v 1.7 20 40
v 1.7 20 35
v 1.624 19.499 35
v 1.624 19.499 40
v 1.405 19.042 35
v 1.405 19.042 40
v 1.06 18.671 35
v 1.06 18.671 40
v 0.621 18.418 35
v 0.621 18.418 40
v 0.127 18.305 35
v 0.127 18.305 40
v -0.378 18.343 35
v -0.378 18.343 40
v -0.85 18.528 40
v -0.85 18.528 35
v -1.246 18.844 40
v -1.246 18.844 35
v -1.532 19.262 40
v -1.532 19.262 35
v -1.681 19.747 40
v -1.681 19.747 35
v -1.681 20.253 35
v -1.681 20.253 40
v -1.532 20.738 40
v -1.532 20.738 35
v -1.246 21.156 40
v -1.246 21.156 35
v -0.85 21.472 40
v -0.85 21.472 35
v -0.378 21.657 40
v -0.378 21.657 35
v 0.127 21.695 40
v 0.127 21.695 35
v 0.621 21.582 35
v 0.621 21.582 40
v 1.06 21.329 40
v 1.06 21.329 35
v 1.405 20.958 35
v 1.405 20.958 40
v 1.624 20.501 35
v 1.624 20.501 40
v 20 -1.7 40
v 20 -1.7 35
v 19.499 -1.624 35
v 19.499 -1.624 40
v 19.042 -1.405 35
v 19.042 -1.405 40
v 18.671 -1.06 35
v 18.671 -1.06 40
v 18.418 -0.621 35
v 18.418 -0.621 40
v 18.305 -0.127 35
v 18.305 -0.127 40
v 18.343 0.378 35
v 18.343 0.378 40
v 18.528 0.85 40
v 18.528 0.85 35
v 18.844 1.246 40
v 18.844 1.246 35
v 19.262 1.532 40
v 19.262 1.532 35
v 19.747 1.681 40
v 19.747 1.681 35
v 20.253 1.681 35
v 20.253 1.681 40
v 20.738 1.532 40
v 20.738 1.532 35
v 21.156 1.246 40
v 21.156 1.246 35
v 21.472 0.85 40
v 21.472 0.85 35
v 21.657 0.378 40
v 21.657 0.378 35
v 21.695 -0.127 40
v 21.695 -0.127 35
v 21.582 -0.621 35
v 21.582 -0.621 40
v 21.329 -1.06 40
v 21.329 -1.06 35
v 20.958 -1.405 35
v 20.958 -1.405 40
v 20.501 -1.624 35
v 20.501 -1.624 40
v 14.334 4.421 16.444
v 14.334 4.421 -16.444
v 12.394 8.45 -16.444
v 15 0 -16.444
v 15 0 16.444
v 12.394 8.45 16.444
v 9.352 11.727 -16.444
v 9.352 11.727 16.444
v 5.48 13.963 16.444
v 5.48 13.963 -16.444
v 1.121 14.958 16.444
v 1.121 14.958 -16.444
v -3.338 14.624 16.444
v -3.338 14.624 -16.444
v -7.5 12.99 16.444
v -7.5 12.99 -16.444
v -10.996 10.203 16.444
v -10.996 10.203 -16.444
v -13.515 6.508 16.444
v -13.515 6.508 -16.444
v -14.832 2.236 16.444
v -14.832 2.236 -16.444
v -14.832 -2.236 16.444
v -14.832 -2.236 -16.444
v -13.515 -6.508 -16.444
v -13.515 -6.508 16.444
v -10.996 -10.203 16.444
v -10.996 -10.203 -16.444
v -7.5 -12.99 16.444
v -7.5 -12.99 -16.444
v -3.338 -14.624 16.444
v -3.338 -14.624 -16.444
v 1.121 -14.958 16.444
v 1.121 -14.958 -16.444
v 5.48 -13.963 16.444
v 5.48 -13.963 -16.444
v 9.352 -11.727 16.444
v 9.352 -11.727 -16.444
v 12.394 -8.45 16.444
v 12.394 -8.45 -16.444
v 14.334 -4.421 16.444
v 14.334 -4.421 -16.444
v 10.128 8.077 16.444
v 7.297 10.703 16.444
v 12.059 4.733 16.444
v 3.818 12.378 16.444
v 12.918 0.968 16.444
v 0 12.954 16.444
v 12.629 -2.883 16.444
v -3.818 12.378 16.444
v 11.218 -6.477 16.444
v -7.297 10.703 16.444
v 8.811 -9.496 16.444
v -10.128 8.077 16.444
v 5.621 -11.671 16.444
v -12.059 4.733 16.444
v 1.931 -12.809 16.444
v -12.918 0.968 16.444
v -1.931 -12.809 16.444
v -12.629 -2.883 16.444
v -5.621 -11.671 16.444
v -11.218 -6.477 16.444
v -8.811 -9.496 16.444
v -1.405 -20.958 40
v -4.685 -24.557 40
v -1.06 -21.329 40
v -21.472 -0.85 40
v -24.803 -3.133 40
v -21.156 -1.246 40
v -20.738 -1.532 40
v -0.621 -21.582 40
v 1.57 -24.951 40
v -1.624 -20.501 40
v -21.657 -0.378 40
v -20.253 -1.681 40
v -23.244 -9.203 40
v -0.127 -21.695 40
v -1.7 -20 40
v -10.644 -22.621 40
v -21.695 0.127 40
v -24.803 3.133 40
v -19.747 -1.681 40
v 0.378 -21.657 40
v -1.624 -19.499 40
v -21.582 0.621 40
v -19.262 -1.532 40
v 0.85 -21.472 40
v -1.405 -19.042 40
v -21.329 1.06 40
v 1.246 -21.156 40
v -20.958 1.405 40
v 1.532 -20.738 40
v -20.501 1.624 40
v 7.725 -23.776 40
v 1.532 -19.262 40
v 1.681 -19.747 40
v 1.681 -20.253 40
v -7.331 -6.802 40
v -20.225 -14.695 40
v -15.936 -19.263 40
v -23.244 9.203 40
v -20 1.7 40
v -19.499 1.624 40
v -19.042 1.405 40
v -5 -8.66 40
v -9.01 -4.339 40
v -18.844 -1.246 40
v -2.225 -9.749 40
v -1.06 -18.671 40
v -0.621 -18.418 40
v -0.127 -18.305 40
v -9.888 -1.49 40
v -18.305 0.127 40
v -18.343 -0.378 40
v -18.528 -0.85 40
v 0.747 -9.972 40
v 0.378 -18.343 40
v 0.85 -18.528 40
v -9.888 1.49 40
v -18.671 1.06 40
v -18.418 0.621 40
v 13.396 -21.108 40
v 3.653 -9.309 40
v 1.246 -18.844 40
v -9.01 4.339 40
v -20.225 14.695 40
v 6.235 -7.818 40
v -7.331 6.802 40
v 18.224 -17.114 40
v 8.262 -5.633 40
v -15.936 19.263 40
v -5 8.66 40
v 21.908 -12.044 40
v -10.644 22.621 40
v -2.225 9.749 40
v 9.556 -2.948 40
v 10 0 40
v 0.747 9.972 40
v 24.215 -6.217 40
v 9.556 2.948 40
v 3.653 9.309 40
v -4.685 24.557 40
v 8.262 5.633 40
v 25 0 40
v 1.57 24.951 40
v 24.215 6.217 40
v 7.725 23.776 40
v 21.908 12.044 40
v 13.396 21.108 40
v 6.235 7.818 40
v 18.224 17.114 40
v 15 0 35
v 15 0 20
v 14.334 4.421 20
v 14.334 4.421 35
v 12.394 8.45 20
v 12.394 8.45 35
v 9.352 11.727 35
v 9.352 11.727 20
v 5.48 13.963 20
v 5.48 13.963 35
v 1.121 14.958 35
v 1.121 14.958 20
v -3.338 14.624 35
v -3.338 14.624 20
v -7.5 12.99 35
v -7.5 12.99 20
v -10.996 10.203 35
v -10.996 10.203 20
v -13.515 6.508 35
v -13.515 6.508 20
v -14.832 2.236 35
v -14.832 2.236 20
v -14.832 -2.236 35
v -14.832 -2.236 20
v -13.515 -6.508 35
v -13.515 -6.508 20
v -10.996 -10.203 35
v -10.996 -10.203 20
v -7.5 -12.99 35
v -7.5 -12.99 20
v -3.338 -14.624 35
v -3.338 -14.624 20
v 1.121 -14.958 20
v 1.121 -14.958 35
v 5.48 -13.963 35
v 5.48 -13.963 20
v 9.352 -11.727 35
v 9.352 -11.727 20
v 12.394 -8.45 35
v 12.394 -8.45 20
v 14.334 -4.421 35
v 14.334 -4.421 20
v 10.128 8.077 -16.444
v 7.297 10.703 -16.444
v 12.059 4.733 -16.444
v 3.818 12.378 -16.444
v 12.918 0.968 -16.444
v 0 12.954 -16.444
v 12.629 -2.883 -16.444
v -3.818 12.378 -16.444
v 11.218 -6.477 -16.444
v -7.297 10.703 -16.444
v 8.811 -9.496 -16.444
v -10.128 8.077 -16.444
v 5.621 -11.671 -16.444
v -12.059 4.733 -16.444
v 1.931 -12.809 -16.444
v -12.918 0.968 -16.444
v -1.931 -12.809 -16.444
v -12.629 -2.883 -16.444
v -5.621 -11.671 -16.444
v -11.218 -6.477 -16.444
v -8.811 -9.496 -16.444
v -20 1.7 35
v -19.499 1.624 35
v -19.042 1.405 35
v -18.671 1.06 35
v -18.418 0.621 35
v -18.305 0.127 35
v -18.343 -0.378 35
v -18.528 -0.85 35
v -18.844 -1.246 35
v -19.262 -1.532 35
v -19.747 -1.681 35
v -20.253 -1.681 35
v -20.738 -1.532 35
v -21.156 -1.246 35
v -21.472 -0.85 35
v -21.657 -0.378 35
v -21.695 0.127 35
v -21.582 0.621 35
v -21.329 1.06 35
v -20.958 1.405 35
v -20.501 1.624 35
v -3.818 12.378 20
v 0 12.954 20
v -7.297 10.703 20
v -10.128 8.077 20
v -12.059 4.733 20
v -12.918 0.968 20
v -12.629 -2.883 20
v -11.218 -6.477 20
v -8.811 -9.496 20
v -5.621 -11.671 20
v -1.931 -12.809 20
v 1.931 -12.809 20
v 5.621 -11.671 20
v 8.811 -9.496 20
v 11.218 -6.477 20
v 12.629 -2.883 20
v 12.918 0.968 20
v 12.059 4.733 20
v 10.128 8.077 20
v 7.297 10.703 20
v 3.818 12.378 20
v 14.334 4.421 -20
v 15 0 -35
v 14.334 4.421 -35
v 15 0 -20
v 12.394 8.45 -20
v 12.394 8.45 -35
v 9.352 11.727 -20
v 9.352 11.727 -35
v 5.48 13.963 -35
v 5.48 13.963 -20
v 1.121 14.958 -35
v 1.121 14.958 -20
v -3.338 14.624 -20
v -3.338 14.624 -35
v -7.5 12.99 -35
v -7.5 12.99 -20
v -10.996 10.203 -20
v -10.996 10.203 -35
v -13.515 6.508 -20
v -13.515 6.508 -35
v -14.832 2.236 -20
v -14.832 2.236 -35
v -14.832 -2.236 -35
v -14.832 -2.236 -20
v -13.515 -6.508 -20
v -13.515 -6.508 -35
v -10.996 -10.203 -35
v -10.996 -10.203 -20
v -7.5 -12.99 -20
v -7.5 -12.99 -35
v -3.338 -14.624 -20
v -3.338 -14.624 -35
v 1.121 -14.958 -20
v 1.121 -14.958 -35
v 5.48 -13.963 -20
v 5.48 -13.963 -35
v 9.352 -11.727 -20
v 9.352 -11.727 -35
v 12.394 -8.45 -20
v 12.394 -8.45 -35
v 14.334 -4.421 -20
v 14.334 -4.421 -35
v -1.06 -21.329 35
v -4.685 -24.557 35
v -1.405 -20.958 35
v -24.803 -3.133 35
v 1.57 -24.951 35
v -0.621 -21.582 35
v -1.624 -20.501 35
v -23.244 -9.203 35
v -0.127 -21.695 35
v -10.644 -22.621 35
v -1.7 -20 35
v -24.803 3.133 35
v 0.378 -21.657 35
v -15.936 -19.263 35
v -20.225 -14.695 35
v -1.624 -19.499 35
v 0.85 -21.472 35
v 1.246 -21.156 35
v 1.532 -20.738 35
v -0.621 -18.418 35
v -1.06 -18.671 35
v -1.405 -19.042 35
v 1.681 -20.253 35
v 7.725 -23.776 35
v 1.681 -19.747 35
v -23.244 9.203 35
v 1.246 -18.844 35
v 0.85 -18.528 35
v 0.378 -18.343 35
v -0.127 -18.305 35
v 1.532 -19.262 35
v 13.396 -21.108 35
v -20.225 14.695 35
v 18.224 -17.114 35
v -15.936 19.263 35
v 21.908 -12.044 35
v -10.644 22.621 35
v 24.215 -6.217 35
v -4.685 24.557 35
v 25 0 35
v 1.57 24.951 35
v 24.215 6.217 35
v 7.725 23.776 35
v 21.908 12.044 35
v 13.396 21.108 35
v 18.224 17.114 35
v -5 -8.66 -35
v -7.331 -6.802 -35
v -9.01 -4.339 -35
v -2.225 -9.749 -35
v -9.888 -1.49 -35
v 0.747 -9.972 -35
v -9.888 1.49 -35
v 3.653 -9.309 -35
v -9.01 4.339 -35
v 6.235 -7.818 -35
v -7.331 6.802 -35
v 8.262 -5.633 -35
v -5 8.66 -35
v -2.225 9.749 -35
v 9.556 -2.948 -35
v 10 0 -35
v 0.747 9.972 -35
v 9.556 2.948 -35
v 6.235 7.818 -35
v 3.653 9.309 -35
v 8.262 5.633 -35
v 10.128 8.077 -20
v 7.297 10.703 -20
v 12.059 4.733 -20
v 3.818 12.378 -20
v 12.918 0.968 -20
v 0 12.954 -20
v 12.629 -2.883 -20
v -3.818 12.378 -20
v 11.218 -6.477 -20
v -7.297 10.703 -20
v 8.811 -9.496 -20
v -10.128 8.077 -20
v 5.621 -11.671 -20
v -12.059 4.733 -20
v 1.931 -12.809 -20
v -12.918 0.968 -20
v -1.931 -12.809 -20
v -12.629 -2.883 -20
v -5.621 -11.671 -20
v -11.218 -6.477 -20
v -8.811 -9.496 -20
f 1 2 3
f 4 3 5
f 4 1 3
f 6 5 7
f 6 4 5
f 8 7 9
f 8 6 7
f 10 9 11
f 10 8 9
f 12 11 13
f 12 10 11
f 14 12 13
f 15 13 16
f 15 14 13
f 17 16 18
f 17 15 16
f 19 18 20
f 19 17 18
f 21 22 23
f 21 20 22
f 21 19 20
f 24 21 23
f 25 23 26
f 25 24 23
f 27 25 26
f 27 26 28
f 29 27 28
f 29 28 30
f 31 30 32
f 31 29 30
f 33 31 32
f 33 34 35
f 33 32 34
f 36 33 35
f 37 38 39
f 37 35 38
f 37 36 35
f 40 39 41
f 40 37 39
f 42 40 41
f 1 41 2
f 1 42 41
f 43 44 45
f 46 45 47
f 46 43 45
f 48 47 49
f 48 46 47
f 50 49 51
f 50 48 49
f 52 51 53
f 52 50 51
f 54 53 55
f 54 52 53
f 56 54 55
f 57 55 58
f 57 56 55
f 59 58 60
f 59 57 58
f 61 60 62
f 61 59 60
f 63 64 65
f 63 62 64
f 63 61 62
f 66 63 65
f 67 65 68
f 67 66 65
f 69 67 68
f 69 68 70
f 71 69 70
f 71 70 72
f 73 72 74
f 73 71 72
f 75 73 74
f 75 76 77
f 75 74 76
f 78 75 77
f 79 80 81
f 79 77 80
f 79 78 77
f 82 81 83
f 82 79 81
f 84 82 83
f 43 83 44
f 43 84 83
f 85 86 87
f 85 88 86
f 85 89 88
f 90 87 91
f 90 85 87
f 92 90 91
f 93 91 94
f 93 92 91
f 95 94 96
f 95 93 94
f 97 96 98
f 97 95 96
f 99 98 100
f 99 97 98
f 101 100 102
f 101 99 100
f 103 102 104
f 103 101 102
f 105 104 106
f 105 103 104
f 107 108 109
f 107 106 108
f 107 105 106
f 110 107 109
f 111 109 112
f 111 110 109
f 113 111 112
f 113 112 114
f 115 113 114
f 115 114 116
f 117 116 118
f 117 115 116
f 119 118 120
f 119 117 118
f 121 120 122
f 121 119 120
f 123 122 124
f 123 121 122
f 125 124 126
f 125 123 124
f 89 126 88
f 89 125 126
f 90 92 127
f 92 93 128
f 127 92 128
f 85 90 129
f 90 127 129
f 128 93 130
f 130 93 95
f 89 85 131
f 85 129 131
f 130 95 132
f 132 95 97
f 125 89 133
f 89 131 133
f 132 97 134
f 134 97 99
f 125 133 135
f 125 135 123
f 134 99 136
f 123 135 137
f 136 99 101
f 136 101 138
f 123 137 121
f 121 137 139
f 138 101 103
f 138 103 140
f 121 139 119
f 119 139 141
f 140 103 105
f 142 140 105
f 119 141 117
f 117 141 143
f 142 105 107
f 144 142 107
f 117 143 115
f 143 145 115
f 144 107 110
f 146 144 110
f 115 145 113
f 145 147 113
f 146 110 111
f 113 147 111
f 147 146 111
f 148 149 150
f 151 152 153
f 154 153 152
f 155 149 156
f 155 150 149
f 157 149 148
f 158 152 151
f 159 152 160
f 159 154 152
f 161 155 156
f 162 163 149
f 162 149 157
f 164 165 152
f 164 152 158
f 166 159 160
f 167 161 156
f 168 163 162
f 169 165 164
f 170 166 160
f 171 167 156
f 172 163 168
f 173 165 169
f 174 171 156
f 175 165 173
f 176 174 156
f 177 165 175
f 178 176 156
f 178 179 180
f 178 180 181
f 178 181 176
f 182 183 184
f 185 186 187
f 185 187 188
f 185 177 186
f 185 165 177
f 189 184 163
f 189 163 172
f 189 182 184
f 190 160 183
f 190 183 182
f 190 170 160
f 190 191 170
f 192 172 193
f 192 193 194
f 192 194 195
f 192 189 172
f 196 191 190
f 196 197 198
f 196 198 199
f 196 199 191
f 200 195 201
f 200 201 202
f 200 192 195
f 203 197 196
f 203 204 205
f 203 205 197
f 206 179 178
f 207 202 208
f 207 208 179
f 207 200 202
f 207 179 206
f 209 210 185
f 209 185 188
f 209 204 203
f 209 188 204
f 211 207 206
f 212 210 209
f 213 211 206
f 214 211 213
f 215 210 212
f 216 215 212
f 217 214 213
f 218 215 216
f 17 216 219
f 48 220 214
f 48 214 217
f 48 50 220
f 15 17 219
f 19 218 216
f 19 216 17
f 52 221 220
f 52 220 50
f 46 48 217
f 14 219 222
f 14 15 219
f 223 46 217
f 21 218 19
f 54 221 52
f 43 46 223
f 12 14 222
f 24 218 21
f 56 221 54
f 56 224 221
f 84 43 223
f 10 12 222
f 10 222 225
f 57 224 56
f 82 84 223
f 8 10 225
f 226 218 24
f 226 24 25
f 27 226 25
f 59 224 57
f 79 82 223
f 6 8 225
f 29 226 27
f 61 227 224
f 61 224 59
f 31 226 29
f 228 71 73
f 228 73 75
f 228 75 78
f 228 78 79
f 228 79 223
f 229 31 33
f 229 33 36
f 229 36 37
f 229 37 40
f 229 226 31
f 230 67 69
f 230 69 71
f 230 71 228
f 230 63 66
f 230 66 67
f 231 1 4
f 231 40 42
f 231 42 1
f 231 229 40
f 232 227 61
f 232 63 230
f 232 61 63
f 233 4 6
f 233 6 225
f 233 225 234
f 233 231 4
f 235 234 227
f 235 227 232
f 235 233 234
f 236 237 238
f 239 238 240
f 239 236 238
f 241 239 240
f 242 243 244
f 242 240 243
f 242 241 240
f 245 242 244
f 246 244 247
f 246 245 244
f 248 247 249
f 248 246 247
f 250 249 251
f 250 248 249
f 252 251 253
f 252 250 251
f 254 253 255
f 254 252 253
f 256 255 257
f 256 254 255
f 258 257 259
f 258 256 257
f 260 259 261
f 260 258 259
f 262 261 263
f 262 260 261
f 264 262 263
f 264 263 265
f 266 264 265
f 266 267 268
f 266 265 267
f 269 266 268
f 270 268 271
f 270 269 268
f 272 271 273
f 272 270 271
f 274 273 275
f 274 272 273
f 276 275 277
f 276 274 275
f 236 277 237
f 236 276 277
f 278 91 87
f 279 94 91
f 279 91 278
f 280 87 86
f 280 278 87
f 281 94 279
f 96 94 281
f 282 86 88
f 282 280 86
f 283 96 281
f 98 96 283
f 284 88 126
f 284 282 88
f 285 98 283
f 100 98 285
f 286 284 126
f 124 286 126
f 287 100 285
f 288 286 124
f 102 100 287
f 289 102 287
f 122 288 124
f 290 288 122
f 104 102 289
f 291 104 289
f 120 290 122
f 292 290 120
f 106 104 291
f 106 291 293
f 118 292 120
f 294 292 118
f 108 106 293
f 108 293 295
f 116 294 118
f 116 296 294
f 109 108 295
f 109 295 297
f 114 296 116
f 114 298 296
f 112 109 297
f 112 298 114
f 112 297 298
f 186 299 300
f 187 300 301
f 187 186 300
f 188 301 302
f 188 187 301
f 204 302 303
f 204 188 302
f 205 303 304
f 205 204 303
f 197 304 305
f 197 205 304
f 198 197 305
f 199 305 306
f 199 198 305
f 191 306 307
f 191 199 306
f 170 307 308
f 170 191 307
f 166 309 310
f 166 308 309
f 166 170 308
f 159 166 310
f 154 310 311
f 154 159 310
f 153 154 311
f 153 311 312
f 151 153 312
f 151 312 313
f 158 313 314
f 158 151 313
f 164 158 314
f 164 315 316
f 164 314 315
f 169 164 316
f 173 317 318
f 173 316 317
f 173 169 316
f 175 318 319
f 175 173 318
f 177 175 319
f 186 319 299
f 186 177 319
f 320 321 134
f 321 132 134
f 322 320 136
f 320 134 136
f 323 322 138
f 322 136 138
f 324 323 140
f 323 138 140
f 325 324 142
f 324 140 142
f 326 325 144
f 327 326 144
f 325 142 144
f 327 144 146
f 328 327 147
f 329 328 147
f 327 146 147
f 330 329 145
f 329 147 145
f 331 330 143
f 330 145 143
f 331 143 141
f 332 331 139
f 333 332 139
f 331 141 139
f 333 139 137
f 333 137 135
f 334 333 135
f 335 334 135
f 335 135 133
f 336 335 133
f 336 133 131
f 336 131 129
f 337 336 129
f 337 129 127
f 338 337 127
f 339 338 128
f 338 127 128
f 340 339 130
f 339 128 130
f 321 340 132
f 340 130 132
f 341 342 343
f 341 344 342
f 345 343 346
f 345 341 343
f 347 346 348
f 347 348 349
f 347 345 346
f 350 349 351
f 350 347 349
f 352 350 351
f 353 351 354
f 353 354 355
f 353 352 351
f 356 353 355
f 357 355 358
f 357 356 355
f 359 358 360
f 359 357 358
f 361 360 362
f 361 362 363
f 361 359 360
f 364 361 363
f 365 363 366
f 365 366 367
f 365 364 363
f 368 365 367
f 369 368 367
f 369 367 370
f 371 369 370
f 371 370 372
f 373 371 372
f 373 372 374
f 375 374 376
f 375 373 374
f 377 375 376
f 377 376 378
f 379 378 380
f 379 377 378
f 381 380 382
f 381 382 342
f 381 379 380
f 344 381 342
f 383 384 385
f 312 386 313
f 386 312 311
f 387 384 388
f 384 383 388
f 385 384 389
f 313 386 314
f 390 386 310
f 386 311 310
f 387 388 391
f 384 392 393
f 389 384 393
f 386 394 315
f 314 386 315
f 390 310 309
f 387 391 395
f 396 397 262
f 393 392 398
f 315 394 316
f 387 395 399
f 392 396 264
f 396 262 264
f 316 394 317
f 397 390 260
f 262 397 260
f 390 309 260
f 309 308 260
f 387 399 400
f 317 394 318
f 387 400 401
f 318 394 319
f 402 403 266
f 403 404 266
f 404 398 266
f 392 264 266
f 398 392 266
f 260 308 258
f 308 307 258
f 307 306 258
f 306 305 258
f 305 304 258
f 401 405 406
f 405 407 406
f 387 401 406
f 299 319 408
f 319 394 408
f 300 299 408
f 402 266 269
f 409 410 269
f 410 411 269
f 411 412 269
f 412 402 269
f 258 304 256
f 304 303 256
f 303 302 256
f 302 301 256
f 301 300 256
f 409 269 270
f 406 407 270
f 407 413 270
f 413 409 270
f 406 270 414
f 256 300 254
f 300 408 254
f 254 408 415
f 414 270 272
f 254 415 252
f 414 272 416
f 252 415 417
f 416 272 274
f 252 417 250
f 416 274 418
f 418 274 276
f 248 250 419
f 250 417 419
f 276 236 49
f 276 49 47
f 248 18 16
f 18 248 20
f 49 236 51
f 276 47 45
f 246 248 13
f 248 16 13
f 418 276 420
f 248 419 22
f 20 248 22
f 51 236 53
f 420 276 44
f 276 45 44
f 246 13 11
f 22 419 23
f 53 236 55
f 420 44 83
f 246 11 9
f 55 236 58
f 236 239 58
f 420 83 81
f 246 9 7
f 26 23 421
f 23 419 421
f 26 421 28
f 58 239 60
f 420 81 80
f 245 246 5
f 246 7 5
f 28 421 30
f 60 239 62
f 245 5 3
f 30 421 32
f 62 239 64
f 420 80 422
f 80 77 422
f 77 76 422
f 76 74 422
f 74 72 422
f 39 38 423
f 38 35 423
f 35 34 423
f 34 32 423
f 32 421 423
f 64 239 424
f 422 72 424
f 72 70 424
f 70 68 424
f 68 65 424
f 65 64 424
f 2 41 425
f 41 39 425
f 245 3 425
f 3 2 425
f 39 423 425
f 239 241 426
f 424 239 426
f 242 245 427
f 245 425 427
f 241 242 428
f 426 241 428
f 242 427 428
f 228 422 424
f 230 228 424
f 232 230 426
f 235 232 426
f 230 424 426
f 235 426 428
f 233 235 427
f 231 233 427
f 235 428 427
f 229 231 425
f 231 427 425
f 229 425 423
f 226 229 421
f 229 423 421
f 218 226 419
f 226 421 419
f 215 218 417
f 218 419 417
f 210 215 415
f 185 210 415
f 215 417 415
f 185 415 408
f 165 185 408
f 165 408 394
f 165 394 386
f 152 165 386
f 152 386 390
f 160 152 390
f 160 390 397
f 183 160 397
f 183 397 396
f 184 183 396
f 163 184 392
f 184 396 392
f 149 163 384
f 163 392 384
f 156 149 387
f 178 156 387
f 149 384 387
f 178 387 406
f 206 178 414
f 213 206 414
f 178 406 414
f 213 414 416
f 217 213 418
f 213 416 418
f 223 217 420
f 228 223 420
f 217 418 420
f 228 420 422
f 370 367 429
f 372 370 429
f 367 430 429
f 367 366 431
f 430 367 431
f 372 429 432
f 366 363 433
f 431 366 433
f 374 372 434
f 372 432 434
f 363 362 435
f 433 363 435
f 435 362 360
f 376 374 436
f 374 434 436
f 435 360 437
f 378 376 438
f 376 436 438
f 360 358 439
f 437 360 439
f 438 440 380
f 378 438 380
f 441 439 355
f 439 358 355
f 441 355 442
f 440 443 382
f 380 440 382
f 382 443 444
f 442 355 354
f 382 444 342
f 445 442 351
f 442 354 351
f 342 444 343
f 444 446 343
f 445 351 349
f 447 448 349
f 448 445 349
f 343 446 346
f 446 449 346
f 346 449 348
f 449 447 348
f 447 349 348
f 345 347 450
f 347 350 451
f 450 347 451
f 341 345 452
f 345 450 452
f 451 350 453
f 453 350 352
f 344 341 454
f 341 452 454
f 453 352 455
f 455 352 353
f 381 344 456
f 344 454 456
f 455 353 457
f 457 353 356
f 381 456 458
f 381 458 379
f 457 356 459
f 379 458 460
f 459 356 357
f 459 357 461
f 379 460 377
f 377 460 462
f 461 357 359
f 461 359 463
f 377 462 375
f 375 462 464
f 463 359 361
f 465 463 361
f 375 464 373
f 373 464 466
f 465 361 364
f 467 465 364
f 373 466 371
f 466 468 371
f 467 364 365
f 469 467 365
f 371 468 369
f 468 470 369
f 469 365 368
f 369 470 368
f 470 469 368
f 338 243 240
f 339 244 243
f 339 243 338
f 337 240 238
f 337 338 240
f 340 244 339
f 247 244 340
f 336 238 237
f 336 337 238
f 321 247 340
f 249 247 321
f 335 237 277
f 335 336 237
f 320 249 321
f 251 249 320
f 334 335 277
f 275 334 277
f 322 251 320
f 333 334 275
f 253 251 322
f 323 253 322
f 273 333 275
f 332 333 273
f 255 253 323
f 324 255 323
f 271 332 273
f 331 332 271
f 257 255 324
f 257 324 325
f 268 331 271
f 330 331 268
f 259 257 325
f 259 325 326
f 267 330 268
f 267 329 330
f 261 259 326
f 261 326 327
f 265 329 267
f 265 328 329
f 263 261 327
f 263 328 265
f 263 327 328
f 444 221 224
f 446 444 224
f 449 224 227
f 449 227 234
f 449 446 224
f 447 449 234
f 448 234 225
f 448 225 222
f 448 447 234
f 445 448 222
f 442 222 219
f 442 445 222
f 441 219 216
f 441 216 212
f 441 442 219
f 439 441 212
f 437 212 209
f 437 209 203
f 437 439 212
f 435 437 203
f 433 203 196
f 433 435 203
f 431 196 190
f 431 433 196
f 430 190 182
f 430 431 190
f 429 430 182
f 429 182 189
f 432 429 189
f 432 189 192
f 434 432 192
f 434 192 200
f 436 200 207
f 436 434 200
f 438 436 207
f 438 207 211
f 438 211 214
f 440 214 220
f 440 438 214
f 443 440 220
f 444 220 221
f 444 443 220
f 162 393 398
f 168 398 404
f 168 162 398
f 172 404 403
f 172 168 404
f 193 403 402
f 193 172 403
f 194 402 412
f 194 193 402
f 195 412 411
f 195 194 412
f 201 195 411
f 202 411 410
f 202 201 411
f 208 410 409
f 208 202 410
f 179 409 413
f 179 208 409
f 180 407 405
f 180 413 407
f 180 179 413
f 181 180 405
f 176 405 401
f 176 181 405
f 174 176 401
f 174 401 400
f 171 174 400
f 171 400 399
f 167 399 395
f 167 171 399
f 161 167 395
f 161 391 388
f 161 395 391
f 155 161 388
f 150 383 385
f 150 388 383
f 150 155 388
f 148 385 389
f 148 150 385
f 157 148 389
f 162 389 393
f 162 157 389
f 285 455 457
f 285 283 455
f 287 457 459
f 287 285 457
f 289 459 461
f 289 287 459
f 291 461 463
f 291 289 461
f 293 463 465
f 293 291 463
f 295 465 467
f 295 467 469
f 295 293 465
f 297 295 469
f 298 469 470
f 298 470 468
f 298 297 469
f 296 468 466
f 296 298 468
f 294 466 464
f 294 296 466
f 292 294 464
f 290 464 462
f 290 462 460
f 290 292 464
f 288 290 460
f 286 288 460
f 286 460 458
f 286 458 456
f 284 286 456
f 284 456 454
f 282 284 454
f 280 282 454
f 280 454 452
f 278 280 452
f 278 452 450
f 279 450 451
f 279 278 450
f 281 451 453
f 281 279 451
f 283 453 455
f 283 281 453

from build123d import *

# Parameters (mm, degrees)
SKETCH1_R           = 15
SKETCH1_R_2         = 10
BOSS_EXTRUDE1_DEPTH = 35
SKETCH5_W           = 3.556
SKETCH5_H           = 2.046
SKETCH6_R           = 25
SKETCH6_R_2         = 10
BOSS_EXTRUDE2_DEPTH = 5
CIRPATTERN1_COUNT   = 4


with BuildPart() as part:
    # Sketch1 → Boss-Extrude1 (new body, symmetric)
    with BuildSketch(Plane.XY):
        Circle(SKETCH1_R)
        Circle(SKETCH1_R_2, mode=Mode.SUBTRACT)
    extrude(amount=BOSS_EXTRUDE1_DEPTH, both=True)

    # Sketch5 → Cut-Revolve1 (revolve, cut)
    with BuildSketch(Plane(origin=(0, 0, 0), x_dir=(0, 0, -1), z_dir=(1, 0, 0))):
        with Locations((-18.222, 13.977)):
            Rectangle(SKETCH5_W, SKETCH5_H)
    cut_revolve1 = revolve(axis=Axis((0, 0, 0), (0, 0, 1)), mode=Mode.SUBTRACT)

    # Mirror1: Cut-Revolve1 across plane
    add(cut_revolve1.mirror(Plane.XY), mode=Mode.SUBTRACT)

    # Sketch6 → Boss-Extrude2 (add)
    with BuildSketch(Plane.XY.offset(35)):
        Circle(SKETCH6_R)
        Circle(SKETCH6_R_2, mode=Mode.SUBTRACT)
    extrude(amount=BOSS_EXTRUDE2_DEPTH)

    # Sketch9 → M3 Clearance Hole1 (revolve, cut)
    with BuildSketch(Plane(origin=(20, 0, 40), x_dir=(0, -1, 0), z_dir=(1, 0, 0))):
        Polygon((0, 0), (0, 18.521463052), (1.7, 17.5), (1.7, 0), align=None)
    m3_clearance_hole1 = revolve(axis=Axis((20, 0, 46.35), (0, 0, -1)), mode=Mode.SUBTRACT)

    # CirPattern1: M3 Clearance Hole1 ×4 about axis
    cirpattern1_axis = Axis((0, 0, 0), (0, 0, 1))
    for i in range(1, CIRPATTERN1_COUNT):
        add(m3_clearance_hole1.rotate(cirpattern1_axis, i * 360 / CIRPATTERN1_COUNT), mode=Mode.SUBTRACT)


solid = part.part
